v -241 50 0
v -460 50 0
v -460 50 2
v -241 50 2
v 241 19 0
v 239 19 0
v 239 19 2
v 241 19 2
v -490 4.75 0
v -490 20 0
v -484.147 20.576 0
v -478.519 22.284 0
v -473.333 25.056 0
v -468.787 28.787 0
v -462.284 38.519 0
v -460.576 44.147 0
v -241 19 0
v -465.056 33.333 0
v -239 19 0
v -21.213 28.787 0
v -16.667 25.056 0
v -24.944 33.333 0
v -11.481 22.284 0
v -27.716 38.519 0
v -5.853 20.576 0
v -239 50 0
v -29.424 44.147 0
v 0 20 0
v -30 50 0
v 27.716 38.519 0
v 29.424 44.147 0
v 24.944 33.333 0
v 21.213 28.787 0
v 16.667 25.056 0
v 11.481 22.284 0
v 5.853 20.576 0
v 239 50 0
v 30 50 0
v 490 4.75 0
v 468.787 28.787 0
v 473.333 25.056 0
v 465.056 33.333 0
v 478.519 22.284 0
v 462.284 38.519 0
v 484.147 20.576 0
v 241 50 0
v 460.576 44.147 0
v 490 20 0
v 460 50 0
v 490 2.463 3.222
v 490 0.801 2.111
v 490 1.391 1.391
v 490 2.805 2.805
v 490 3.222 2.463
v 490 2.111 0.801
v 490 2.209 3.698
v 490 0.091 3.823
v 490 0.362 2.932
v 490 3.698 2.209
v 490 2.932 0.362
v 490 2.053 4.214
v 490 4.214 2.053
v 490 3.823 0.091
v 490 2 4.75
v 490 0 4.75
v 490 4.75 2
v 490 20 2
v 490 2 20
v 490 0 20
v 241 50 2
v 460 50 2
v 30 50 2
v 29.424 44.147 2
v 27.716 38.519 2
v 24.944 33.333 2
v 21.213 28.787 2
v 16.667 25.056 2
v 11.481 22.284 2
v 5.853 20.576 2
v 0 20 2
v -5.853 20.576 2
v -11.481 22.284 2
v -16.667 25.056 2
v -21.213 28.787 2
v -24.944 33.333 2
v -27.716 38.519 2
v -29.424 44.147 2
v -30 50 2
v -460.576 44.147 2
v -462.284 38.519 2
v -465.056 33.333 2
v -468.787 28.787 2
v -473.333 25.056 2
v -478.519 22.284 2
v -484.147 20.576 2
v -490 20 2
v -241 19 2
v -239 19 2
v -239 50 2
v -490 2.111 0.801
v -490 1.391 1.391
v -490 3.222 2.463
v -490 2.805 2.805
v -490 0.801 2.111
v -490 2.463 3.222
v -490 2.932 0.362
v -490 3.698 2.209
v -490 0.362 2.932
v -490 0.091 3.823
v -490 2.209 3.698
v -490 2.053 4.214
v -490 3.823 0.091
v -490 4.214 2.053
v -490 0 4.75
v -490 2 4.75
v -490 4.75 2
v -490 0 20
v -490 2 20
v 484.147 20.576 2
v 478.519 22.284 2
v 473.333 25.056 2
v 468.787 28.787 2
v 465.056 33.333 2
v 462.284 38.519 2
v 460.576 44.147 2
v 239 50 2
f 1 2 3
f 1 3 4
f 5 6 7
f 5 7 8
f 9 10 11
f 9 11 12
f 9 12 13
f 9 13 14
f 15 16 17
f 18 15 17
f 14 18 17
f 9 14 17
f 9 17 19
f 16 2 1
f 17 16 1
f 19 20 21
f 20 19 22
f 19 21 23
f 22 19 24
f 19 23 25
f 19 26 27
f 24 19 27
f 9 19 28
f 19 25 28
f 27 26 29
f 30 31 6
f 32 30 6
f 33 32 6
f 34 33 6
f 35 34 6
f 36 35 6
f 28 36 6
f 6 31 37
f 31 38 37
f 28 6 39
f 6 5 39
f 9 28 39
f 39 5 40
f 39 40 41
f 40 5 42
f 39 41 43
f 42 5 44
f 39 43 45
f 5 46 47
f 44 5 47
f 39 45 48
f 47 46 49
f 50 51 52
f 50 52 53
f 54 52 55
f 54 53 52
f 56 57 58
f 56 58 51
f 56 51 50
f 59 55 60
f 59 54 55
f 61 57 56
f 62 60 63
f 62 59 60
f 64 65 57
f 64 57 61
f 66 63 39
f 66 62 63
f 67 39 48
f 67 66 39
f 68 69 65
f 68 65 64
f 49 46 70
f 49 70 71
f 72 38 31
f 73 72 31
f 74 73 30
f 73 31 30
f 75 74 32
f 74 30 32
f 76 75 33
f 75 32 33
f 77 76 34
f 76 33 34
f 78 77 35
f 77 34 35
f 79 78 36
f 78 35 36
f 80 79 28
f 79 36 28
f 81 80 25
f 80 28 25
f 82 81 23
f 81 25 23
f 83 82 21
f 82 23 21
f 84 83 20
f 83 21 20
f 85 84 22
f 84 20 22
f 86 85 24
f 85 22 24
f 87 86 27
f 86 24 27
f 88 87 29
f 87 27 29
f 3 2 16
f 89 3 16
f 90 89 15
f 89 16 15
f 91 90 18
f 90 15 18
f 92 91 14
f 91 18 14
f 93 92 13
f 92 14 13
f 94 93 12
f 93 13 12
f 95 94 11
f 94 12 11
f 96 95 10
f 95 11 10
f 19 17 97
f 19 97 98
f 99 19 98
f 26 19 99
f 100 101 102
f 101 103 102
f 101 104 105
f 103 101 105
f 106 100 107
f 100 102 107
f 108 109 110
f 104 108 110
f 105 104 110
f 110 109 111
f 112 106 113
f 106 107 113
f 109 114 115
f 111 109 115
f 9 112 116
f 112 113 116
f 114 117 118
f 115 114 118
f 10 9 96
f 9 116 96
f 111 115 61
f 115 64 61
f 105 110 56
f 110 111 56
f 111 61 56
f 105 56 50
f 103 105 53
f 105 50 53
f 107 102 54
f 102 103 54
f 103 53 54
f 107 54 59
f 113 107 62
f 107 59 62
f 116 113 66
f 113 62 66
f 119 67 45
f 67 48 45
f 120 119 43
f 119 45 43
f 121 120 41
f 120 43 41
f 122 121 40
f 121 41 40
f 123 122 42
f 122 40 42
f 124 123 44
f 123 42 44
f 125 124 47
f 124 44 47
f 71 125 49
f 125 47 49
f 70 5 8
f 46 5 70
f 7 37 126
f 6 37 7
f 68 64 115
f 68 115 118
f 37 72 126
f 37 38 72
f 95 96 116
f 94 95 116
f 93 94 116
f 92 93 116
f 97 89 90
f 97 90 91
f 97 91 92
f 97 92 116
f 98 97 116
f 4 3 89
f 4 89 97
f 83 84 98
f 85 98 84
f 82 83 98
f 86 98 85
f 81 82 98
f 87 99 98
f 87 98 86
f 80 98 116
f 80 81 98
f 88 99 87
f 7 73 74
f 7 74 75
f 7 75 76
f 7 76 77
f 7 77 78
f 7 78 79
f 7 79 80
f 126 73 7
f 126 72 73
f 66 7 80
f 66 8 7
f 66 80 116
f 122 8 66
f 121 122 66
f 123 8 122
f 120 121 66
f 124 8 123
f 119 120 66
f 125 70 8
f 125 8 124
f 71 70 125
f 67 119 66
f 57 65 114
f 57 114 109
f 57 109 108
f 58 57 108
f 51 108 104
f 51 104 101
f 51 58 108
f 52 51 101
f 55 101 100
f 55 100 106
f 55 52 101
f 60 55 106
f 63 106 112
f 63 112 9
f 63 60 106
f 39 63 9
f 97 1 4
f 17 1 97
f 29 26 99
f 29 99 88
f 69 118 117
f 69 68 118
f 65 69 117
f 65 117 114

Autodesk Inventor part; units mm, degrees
ref_plane "YZ Plane" through (0, 0, 0) normal (1, 0, 0) x (0, 1, 0)
ref_plane "XZ Plane" through (0, 0, 0) normal (0, 1, 0) x (-1, 0, 0)
ref_plane "XY Plane" through (0, 0, 0) normal (0, 0, 1) x (1, 0, 0)
sketch "Sketch1" plane through (0, 0, 0) normal (0, 0, 1) x (1, 0, 0)
  line L0 (-490, 50) -> (490, 50)
  line L1 (490, 50) -> (490, 0)
  line L2 (490, 0) -> (-490, 0)
  line L3 (-490, 0) -> (-490, 50)
  point P0 (0, 0)
  point P1 (0, 0)
  dimension "d0" = 980
  dimension "d1" = 50
extrude "Plate1" add sketch "Sketch1" along normal blind 2
sketch "Sketch2" plane through (490, 2, 0) normal (0, -1, 0) x (1, 0, 0)
  line L0 (-980, 0) -> (0, 0)
  line L1 (0, 0) -> (0, 20)
  line L2 (0, 20) -> (-980, 20)
  line L3 (-980, 20) -> (-980, 0)
edge flange "Flange1" height 20 angle 90 thickness 2 bend radius 2.75 thickness toward (0, -1, 0) relief tear relief width 2 relief depth 1 edges at (0, 0, 2) wall of the first edge with corners at (-490, 2, 0) (490, 2, 0) (490, 2, 20) (-490, 2, 20)
bend "Bend1"
corner "Corner1"
sketch "Sketch5" plane through (0, 0, 0) normal (0, 0, -1) x (-1, 0, 0)
  line L0 (490, 50) -> (-490, 50) projected
  line L1 (490, 0) -> (-490, 0) projected
  circle A0 centre (0, 50) radius 30
  line L2 (-490, 0) -> (-490, 50)
  line L3 (490, 0) -> (490, 50)
  circle A1 centre (-490, 50) radius 30
  circle A2 centre (490, 50) radius 30
  line L4 (-241, 50) -> (-239, 50)
  line L5 (-239, 50) -> (-239, 19)
  line L6 (-239, 19) -> (-241, 19)
  line L7 (-241, 19) -> (-241, 50)
  line L8 (239, 50) -> (241, 50)
  line L9 (241, 50) -> (241, 19)
  line L10 (241, 19) -> (239, 19)
  line L11 (239, 19) -> (239, 50)
  line L12 (0, 50) -> (0, 0) construction
  point P0 (240, 19)
  point P1 (-240, 19)
  point P2 (-490, 20)
  point P3 (-460, 50)
  point P4 (-30, 50)
  point P5 (30, 50)
  point P6 (460, 50)
  point P7 (490, 20)
  dimension "d33" = 60
  dimension "d34" = 2
  dimension "d35" = 31
  dimension "d36" = 480
extrude "Extrusion1" cut sketch "Sketch5" against normal through all contours L9 L10 L11 L0 | L0 L3 A2 | A0 L0 | L5 L6 L7 L0 | L2 L0 A1 picked at (470.2507, 47.7748) picked at (6.5355, 34.7298) picked at (-470.2507, 47.7748)
sketch "Sketch7" plane through (0, 0, 2) normal (0, 0, 1) x (1, 0, 0)
  line L0 (468.7934, 20.88) -> (468.7934, 8.88) construction
  line L1 (468.7934, 8.88) -> (280.354, 8.88) construction
  line L2 (280.354, 8.88) -> (280.354, 20.88) construction
  line L3 (280.354, 20.88) -> (468.7934, 20.88) construction
  line L4 (-239, 50) -> (-30, 50) projected
  point P0 (0, 0)
  point P1 (-1, 50)
  point P2 (1, 50)
  dimension "d30" = 12
mark "Mark1"
equation "\"d1\" = Стрингер_7"
equation "\"d2\" = Thickness"
equation "\"d3\" = BendReliefWidth"
equation "\"d4\" = BendReliefDepth"
equation "\"d5\" = MinimumRemnant"
equation "\"d6\" = TransitionRadius"
equation "\"d9\" = BendRadius"
equation "\"d10\" = CornerReliefSize"
equation "\"d11\" = GapSize"
equation "\"d12\" = JacobiRadiusSize"
equation "\"BendReliefWidth\" = Thickness"
equation "\"BendReliefDepth\" = 0.5 * Thickness"
equation "\"CornerReliefSize\" = 4 * Thickness"
equation "\"MinimumRemnant\" = 2 * Thickness"
equation "\"TransitionRadius\" = BendRadius"
equation "\"JacobiRadiusSize\" = BendRadius"
equation "\"GapSize\" = Thickness"
equation "\"Стрингер_7\" = 50"
equation "\"Thickness\" = 2"
equation "\"BendRadius\" = 2.75"
properties part number "MSC 504 stringer board belly" material "Stainless Steel"
